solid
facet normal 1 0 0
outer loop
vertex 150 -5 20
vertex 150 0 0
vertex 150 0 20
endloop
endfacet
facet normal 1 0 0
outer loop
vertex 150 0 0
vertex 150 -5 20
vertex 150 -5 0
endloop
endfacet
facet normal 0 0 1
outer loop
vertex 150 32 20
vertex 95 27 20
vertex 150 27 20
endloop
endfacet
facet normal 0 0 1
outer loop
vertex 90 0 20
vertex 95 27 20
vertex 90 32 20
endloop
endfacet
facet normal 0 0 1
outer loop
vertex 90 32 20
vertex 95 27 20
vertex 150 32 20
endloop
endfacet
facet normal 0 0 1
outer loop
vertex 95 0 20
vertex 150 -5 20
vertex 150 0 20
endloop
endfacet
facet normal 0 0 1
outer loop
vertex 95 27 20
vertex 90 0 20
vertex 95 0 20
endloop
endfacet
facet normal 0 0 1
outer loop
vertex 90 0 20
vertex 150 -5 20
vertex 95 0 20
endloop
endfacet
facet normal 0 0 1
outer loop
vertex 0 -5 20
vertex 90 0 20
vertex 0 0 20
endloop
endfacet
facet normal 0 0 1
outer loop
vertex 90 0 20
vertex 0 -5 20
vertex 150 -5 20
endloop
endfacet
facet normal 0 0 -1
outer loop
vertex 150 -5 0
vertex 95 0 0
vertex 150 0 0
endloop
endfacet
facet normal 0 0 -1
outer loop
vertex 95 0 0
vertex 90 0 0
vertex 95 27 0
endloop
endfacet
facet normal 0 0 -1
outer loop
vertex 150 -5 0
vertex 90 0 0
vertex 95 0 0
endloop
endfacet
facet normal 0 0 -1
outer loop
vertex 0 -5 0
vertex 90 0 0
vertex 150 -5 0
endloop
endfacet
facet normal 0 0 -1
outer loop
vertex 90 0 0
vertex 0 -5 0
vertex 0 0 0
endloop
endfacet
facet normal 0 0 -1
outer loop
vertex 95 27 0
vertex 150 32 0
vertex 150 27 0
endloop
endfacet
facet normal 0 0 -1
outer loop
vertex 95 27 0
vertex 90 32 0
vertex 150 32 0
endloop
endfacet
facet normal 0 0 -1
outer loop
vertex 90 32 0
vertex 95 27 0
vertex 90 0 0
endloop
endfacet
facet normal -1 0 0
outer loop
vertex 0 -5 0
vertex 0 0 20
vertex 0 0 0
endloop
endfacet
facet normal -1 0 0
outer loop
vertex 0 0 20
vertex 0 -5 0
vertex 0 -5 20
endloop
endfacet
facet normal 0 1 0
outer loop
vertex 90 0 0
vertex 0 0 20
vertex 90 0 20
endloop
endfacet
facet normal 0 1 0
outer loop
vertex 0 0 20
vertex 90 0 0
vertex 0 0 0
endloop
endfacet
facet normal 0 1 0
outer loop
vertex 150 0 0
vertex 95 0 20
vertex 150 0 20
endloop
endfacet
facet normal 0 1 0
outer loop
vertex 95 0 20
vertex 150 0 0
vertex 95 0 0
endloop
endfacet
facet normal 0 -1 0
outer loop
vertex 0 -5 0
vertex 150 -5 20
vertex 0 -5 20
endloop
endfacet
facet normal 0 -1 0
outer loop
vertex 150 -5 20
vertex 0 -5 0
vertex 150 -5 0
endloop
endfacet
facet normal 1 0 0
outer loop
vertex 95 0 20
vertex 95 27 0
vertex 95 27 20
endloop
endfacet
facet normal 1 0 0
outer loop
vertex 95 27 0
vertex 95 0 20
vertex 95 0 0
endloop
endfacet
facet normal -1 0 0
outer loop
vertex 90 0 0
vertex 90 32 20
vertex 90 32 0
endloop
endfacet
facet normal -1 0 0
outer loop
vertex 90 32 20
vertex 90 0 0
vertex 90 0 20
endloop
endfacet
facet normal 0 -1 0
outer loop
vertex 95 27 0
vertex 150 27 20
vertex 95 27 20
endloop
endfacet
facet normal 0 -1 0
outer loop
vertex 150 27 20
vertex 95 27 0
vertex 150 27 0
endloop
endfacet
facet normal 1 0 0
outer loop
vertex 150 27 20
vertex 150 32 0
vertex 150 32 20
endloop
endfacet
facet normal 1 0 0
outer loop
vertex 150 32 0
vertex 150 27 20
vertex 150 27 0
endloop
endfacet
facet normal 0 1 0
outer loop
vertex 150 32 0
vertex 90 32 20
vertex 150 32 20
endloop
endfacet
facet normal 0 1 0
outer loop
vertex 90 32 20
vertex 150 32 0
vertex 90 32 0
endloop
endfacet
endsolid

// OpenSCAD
//// CONFIGURATION In mm////
width=20;
deskDepth=60;
supportLength=150;
deskThickness=27;
supportThickness=5;

//// DERIVED VARS ////

//difference() {
  union() {
    translate([0,0-supportThickness,0]) {
      cube([supportLength,supportThickness,width],center=false);
    }
    translate([supportLength-deskDepth,0,0]) {
      cube([supportThickness,deskThickness,width],center=false);  
    }
    translate([supportLength-deskDepth,deskThickness,0]) {
        cube([deskDepth,supportThickness,width],center=false); 
    } 
  }
//  union() {
//    translate([x*spacing+(spacing/2),height/2,0])
//      cylinder(h=width+.1,d=shaftSize,center=false);    
//  }

//}gt
